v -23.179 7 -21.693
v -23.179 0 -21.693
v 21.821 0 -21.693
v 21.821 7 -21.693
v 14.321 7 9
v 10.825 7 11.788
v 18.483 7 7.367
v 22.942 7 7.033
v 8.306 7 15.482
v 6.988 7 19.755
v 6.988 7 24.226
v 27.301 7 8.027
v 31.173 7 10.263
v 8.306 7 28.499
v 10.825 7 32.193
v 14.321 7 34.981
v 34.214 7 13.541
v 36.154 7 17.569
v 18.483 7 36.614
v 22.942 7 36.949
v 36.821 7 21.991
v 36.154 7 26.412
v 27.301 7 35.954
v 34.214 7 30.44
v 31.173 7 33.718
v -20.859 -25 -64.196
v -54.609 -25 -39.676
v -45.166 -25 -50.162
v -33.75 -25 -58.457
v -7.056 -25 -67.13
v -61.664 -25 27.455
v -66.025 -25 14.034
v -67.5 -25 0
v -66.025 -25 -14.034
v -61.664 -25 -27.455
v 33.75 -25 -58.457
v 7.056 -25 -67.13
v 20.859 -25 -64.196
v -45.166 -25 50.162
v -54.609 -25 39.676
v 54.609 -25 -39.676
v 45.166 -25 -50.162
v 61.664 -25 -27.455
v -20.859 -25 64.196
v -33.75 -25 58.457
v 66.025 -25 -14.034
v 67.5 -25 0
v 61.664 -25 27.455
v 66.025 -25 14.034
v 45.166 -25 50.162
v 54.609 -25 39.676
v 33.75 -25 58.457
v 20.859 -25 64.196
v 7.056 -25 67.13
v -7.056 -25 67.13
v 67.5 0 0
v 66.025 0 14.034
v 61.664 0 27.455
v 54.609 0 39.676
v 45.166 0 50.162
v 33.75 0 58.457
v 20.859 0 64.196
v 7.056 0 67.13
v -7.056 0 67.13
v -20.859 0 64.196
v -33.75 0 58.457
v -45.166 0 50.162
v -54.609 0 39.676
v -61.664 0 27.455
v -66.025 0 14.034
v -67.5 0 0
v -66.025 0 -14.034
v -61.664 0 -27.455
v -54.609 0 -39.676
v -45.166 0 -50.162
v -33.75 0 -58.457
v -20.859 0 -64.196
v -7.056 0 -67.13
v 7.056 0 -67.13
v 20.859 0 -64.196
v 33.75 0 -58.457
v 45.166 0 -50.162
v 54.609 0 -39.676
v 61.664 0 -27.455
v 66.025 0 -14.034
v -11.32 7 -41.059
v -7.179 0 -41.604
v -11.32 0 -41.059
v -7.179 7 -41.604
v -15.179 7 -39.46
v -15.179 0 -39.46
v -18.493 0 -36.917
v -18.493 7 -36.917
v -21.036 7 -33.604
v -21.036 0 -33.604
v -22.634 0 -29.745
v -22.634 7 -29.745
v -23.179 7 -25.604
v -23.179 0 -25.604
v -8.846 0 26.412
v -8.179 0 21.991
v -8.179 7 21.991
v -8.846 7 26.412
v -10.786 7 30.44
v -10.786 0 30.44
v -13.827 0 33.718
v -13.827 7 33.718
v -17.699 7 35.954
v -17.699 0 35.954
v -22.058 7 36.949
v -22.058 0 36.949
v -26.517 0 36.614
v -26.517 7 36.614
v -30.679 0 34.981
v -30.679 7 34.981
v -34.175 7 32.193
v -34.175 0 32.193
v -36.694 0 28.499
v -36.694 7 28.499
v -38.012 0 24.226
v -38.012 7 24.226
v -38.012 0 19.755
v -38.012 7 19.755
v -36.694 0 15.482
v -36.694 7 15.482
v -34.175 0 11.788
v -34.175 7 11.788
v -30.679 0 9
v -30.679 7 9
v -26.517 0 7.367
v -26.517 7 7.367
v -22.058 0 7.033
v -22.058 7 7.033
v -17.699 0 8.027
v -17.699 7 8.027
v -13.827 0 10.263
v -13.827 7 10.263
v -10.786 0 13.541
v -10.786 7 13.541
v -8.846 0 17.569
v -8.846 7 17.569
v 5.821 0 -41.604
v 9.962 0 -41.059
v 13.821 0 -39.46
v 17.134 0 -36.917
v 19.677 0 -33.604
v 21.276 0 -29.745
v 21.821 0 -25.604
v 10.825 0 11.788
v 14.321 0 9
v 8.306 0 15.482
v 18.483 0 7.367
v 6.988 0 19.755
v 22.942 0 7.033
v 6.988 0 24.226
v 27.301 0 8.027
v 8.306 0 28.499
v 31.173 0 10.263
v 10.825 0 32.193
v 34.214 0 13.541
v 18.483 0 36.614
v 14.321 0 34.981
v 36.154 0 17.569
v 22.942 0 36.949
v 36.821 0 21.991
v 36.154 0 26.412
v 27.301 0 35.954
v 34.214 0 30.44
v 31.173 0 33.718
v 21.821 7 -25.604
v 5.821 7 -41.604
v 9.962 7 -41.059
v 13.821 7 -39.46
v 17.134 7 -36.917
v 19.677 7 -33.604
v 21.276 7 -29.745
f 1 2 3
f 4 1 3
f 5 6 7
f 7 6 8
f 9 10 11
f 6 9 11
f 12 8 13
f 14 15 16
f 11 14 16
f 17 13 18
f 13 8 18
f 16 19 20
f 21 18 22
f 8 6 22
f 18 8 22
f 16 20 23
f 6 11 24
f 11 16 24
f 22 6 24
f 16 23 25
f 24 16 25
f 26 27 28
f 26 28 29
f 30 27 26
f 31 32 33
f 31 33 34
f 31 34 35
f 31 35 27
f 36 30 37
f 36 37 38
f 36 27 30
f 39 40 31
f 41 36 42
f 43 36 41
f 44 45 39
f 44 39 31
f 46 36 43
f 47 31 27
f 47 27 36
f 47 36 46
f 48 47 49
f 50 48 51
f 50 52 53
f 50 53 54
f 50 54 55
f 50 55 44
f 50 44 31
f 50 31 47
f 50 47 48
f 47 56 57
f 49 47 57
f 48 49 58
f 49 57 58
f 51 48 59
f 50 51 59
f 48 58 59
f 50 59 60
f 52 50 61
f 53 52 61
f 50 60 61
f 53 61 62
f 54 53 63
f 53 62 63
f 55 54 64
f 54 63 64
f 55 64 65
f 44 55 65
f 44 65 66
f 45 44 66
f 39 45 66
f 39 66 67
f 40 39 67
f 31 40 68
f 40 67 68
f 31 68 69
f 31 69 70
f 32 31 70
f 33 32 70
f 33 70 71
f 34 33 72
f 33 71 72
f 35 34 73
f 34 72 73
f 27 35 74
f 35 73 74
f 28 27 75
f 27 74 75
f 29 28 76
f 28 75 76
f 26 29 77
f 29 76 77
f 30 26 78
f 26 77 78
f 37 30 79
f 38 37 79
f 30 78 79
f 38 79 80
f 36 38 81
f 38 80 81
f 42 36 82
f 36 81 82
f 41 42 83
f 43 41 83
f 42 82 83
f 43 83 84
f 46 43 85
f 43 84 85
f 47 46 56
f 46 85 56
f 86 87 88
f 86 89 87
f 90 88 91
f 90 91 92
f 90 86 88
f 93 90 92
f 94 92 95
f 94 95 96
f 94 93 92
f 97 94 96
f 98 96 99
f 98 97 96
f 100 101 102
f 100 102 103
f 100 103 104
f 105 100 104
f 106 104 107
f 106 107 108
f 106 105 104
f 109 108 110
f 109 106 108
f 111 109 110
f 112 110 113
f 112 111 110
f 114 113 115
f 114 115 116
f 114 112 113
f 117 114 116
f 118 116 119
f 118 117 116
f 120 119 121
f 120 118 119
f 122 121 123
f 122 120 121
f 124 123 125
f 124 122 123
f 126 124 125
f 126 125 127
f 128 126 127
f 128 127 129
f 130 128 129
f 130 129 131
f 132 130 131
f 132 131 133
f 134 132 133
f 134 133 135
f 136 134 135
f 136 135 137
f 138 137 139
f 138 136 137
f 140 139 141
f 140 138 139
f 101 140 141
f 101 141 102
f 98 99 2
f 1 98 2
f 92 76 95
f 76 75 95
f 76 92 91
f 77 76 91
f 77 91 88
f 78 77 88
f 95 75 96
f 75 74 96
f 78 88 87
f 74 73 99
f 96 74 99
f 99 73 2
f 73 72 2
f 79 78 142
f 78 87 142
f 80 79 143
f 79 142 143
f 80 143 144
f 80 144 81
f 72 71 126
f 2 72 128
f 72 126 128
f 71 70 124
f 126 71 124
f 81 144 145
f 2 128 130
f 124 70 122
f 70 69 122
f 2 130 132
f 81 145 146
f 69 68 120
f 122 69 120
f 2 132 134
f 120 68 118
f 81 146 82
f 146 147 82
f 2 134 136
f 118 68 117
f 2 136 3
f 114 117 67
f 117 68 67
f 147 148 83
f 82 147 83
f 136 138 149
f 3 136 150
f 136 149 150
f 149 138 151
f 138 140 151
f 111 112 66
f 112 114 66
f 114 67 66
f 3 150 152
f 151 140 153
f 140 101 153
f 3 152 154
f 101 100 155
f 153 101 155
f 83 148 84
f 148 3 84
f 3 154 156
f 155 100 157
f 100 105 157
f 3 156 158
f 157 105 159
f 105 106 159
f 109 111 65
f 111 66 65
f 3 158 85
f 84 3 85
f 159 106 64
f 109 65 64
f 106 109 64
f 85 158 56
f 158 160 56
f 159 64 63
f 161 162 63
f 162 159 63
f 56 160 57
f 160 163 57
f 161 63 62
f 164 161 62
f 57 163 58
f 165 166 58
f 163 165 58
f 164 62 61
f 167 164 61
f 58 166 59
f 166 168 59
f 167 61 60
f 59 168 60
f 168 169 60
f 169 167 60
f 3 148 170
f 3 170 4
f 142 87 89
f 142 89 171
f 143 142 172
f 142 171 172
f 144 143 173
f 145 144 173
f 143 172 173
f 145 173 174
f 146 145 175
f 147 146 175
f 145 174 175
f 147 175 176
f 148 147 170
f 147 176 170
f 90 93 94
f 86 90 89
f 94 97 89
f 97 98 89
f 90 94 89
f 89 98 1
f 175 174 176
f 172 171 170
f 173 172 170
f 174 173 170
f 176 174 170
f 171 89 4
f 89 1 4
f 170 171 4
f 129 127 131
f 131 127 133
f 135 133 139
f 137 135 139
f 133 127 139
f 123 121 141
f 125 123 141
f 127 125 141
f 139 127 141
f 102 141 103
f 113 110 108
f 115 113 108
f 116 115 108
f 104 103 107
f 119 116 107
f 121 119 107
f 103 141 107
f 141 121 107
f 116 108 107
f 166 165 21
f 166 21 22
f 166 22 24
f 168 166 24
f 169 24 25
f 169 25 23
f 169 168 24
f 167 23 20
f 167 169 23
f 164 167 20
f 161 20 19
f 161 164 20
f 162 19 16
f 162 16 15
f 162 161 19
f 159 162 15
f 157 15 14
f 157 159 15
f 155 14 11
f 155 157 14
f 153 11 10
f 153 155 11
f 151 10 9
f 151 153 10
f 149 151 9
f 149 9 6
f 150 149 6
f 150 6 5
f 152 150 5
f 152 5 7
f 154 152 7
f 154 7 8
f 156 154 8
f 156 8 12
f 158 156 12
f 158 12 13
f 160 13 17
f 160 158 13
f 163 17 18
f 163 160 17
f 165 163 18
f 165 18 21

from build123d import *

# Parameters (mm, degrees)
F0_R     = 67.5
F1_DEPTH = 25
F2_R     = 15
F2_W     = 45
F2_H     = 19.910383
F3_DEPTH = 7
F4_R     = 16


with BuildPart() as f1:
    # F0 (on Front) → F1 (new body)
    with BuildSketch(Plane.XZ):
        Circle(F0_R)
    extrude(amount=F1_DEPTH)

    # F2 (on Front) → F3 (join)
    with BuildSketch(Plane.XZ):
        with Locations((-23.179246, 21.990567)):
            Circle(F2_R)
        with Locations((21.820754, 21.990567)):
            Circle(F2_R)
        with Locations((-0.679246, -31.648587)):
            Rectangle(F2_W, F2_H)
    extrude(amount=-F3_DEPTH)

    # F4
    f4_edges = [f1.edges().sort_by_distance(p)[0] for p in [
        (21.820754, 3.5, -41.603778),
        (-23.179246, 3.5, -41.603778),
    ]]
    fillet(f4_edges, radius=F4_R)


solid = f1.part
